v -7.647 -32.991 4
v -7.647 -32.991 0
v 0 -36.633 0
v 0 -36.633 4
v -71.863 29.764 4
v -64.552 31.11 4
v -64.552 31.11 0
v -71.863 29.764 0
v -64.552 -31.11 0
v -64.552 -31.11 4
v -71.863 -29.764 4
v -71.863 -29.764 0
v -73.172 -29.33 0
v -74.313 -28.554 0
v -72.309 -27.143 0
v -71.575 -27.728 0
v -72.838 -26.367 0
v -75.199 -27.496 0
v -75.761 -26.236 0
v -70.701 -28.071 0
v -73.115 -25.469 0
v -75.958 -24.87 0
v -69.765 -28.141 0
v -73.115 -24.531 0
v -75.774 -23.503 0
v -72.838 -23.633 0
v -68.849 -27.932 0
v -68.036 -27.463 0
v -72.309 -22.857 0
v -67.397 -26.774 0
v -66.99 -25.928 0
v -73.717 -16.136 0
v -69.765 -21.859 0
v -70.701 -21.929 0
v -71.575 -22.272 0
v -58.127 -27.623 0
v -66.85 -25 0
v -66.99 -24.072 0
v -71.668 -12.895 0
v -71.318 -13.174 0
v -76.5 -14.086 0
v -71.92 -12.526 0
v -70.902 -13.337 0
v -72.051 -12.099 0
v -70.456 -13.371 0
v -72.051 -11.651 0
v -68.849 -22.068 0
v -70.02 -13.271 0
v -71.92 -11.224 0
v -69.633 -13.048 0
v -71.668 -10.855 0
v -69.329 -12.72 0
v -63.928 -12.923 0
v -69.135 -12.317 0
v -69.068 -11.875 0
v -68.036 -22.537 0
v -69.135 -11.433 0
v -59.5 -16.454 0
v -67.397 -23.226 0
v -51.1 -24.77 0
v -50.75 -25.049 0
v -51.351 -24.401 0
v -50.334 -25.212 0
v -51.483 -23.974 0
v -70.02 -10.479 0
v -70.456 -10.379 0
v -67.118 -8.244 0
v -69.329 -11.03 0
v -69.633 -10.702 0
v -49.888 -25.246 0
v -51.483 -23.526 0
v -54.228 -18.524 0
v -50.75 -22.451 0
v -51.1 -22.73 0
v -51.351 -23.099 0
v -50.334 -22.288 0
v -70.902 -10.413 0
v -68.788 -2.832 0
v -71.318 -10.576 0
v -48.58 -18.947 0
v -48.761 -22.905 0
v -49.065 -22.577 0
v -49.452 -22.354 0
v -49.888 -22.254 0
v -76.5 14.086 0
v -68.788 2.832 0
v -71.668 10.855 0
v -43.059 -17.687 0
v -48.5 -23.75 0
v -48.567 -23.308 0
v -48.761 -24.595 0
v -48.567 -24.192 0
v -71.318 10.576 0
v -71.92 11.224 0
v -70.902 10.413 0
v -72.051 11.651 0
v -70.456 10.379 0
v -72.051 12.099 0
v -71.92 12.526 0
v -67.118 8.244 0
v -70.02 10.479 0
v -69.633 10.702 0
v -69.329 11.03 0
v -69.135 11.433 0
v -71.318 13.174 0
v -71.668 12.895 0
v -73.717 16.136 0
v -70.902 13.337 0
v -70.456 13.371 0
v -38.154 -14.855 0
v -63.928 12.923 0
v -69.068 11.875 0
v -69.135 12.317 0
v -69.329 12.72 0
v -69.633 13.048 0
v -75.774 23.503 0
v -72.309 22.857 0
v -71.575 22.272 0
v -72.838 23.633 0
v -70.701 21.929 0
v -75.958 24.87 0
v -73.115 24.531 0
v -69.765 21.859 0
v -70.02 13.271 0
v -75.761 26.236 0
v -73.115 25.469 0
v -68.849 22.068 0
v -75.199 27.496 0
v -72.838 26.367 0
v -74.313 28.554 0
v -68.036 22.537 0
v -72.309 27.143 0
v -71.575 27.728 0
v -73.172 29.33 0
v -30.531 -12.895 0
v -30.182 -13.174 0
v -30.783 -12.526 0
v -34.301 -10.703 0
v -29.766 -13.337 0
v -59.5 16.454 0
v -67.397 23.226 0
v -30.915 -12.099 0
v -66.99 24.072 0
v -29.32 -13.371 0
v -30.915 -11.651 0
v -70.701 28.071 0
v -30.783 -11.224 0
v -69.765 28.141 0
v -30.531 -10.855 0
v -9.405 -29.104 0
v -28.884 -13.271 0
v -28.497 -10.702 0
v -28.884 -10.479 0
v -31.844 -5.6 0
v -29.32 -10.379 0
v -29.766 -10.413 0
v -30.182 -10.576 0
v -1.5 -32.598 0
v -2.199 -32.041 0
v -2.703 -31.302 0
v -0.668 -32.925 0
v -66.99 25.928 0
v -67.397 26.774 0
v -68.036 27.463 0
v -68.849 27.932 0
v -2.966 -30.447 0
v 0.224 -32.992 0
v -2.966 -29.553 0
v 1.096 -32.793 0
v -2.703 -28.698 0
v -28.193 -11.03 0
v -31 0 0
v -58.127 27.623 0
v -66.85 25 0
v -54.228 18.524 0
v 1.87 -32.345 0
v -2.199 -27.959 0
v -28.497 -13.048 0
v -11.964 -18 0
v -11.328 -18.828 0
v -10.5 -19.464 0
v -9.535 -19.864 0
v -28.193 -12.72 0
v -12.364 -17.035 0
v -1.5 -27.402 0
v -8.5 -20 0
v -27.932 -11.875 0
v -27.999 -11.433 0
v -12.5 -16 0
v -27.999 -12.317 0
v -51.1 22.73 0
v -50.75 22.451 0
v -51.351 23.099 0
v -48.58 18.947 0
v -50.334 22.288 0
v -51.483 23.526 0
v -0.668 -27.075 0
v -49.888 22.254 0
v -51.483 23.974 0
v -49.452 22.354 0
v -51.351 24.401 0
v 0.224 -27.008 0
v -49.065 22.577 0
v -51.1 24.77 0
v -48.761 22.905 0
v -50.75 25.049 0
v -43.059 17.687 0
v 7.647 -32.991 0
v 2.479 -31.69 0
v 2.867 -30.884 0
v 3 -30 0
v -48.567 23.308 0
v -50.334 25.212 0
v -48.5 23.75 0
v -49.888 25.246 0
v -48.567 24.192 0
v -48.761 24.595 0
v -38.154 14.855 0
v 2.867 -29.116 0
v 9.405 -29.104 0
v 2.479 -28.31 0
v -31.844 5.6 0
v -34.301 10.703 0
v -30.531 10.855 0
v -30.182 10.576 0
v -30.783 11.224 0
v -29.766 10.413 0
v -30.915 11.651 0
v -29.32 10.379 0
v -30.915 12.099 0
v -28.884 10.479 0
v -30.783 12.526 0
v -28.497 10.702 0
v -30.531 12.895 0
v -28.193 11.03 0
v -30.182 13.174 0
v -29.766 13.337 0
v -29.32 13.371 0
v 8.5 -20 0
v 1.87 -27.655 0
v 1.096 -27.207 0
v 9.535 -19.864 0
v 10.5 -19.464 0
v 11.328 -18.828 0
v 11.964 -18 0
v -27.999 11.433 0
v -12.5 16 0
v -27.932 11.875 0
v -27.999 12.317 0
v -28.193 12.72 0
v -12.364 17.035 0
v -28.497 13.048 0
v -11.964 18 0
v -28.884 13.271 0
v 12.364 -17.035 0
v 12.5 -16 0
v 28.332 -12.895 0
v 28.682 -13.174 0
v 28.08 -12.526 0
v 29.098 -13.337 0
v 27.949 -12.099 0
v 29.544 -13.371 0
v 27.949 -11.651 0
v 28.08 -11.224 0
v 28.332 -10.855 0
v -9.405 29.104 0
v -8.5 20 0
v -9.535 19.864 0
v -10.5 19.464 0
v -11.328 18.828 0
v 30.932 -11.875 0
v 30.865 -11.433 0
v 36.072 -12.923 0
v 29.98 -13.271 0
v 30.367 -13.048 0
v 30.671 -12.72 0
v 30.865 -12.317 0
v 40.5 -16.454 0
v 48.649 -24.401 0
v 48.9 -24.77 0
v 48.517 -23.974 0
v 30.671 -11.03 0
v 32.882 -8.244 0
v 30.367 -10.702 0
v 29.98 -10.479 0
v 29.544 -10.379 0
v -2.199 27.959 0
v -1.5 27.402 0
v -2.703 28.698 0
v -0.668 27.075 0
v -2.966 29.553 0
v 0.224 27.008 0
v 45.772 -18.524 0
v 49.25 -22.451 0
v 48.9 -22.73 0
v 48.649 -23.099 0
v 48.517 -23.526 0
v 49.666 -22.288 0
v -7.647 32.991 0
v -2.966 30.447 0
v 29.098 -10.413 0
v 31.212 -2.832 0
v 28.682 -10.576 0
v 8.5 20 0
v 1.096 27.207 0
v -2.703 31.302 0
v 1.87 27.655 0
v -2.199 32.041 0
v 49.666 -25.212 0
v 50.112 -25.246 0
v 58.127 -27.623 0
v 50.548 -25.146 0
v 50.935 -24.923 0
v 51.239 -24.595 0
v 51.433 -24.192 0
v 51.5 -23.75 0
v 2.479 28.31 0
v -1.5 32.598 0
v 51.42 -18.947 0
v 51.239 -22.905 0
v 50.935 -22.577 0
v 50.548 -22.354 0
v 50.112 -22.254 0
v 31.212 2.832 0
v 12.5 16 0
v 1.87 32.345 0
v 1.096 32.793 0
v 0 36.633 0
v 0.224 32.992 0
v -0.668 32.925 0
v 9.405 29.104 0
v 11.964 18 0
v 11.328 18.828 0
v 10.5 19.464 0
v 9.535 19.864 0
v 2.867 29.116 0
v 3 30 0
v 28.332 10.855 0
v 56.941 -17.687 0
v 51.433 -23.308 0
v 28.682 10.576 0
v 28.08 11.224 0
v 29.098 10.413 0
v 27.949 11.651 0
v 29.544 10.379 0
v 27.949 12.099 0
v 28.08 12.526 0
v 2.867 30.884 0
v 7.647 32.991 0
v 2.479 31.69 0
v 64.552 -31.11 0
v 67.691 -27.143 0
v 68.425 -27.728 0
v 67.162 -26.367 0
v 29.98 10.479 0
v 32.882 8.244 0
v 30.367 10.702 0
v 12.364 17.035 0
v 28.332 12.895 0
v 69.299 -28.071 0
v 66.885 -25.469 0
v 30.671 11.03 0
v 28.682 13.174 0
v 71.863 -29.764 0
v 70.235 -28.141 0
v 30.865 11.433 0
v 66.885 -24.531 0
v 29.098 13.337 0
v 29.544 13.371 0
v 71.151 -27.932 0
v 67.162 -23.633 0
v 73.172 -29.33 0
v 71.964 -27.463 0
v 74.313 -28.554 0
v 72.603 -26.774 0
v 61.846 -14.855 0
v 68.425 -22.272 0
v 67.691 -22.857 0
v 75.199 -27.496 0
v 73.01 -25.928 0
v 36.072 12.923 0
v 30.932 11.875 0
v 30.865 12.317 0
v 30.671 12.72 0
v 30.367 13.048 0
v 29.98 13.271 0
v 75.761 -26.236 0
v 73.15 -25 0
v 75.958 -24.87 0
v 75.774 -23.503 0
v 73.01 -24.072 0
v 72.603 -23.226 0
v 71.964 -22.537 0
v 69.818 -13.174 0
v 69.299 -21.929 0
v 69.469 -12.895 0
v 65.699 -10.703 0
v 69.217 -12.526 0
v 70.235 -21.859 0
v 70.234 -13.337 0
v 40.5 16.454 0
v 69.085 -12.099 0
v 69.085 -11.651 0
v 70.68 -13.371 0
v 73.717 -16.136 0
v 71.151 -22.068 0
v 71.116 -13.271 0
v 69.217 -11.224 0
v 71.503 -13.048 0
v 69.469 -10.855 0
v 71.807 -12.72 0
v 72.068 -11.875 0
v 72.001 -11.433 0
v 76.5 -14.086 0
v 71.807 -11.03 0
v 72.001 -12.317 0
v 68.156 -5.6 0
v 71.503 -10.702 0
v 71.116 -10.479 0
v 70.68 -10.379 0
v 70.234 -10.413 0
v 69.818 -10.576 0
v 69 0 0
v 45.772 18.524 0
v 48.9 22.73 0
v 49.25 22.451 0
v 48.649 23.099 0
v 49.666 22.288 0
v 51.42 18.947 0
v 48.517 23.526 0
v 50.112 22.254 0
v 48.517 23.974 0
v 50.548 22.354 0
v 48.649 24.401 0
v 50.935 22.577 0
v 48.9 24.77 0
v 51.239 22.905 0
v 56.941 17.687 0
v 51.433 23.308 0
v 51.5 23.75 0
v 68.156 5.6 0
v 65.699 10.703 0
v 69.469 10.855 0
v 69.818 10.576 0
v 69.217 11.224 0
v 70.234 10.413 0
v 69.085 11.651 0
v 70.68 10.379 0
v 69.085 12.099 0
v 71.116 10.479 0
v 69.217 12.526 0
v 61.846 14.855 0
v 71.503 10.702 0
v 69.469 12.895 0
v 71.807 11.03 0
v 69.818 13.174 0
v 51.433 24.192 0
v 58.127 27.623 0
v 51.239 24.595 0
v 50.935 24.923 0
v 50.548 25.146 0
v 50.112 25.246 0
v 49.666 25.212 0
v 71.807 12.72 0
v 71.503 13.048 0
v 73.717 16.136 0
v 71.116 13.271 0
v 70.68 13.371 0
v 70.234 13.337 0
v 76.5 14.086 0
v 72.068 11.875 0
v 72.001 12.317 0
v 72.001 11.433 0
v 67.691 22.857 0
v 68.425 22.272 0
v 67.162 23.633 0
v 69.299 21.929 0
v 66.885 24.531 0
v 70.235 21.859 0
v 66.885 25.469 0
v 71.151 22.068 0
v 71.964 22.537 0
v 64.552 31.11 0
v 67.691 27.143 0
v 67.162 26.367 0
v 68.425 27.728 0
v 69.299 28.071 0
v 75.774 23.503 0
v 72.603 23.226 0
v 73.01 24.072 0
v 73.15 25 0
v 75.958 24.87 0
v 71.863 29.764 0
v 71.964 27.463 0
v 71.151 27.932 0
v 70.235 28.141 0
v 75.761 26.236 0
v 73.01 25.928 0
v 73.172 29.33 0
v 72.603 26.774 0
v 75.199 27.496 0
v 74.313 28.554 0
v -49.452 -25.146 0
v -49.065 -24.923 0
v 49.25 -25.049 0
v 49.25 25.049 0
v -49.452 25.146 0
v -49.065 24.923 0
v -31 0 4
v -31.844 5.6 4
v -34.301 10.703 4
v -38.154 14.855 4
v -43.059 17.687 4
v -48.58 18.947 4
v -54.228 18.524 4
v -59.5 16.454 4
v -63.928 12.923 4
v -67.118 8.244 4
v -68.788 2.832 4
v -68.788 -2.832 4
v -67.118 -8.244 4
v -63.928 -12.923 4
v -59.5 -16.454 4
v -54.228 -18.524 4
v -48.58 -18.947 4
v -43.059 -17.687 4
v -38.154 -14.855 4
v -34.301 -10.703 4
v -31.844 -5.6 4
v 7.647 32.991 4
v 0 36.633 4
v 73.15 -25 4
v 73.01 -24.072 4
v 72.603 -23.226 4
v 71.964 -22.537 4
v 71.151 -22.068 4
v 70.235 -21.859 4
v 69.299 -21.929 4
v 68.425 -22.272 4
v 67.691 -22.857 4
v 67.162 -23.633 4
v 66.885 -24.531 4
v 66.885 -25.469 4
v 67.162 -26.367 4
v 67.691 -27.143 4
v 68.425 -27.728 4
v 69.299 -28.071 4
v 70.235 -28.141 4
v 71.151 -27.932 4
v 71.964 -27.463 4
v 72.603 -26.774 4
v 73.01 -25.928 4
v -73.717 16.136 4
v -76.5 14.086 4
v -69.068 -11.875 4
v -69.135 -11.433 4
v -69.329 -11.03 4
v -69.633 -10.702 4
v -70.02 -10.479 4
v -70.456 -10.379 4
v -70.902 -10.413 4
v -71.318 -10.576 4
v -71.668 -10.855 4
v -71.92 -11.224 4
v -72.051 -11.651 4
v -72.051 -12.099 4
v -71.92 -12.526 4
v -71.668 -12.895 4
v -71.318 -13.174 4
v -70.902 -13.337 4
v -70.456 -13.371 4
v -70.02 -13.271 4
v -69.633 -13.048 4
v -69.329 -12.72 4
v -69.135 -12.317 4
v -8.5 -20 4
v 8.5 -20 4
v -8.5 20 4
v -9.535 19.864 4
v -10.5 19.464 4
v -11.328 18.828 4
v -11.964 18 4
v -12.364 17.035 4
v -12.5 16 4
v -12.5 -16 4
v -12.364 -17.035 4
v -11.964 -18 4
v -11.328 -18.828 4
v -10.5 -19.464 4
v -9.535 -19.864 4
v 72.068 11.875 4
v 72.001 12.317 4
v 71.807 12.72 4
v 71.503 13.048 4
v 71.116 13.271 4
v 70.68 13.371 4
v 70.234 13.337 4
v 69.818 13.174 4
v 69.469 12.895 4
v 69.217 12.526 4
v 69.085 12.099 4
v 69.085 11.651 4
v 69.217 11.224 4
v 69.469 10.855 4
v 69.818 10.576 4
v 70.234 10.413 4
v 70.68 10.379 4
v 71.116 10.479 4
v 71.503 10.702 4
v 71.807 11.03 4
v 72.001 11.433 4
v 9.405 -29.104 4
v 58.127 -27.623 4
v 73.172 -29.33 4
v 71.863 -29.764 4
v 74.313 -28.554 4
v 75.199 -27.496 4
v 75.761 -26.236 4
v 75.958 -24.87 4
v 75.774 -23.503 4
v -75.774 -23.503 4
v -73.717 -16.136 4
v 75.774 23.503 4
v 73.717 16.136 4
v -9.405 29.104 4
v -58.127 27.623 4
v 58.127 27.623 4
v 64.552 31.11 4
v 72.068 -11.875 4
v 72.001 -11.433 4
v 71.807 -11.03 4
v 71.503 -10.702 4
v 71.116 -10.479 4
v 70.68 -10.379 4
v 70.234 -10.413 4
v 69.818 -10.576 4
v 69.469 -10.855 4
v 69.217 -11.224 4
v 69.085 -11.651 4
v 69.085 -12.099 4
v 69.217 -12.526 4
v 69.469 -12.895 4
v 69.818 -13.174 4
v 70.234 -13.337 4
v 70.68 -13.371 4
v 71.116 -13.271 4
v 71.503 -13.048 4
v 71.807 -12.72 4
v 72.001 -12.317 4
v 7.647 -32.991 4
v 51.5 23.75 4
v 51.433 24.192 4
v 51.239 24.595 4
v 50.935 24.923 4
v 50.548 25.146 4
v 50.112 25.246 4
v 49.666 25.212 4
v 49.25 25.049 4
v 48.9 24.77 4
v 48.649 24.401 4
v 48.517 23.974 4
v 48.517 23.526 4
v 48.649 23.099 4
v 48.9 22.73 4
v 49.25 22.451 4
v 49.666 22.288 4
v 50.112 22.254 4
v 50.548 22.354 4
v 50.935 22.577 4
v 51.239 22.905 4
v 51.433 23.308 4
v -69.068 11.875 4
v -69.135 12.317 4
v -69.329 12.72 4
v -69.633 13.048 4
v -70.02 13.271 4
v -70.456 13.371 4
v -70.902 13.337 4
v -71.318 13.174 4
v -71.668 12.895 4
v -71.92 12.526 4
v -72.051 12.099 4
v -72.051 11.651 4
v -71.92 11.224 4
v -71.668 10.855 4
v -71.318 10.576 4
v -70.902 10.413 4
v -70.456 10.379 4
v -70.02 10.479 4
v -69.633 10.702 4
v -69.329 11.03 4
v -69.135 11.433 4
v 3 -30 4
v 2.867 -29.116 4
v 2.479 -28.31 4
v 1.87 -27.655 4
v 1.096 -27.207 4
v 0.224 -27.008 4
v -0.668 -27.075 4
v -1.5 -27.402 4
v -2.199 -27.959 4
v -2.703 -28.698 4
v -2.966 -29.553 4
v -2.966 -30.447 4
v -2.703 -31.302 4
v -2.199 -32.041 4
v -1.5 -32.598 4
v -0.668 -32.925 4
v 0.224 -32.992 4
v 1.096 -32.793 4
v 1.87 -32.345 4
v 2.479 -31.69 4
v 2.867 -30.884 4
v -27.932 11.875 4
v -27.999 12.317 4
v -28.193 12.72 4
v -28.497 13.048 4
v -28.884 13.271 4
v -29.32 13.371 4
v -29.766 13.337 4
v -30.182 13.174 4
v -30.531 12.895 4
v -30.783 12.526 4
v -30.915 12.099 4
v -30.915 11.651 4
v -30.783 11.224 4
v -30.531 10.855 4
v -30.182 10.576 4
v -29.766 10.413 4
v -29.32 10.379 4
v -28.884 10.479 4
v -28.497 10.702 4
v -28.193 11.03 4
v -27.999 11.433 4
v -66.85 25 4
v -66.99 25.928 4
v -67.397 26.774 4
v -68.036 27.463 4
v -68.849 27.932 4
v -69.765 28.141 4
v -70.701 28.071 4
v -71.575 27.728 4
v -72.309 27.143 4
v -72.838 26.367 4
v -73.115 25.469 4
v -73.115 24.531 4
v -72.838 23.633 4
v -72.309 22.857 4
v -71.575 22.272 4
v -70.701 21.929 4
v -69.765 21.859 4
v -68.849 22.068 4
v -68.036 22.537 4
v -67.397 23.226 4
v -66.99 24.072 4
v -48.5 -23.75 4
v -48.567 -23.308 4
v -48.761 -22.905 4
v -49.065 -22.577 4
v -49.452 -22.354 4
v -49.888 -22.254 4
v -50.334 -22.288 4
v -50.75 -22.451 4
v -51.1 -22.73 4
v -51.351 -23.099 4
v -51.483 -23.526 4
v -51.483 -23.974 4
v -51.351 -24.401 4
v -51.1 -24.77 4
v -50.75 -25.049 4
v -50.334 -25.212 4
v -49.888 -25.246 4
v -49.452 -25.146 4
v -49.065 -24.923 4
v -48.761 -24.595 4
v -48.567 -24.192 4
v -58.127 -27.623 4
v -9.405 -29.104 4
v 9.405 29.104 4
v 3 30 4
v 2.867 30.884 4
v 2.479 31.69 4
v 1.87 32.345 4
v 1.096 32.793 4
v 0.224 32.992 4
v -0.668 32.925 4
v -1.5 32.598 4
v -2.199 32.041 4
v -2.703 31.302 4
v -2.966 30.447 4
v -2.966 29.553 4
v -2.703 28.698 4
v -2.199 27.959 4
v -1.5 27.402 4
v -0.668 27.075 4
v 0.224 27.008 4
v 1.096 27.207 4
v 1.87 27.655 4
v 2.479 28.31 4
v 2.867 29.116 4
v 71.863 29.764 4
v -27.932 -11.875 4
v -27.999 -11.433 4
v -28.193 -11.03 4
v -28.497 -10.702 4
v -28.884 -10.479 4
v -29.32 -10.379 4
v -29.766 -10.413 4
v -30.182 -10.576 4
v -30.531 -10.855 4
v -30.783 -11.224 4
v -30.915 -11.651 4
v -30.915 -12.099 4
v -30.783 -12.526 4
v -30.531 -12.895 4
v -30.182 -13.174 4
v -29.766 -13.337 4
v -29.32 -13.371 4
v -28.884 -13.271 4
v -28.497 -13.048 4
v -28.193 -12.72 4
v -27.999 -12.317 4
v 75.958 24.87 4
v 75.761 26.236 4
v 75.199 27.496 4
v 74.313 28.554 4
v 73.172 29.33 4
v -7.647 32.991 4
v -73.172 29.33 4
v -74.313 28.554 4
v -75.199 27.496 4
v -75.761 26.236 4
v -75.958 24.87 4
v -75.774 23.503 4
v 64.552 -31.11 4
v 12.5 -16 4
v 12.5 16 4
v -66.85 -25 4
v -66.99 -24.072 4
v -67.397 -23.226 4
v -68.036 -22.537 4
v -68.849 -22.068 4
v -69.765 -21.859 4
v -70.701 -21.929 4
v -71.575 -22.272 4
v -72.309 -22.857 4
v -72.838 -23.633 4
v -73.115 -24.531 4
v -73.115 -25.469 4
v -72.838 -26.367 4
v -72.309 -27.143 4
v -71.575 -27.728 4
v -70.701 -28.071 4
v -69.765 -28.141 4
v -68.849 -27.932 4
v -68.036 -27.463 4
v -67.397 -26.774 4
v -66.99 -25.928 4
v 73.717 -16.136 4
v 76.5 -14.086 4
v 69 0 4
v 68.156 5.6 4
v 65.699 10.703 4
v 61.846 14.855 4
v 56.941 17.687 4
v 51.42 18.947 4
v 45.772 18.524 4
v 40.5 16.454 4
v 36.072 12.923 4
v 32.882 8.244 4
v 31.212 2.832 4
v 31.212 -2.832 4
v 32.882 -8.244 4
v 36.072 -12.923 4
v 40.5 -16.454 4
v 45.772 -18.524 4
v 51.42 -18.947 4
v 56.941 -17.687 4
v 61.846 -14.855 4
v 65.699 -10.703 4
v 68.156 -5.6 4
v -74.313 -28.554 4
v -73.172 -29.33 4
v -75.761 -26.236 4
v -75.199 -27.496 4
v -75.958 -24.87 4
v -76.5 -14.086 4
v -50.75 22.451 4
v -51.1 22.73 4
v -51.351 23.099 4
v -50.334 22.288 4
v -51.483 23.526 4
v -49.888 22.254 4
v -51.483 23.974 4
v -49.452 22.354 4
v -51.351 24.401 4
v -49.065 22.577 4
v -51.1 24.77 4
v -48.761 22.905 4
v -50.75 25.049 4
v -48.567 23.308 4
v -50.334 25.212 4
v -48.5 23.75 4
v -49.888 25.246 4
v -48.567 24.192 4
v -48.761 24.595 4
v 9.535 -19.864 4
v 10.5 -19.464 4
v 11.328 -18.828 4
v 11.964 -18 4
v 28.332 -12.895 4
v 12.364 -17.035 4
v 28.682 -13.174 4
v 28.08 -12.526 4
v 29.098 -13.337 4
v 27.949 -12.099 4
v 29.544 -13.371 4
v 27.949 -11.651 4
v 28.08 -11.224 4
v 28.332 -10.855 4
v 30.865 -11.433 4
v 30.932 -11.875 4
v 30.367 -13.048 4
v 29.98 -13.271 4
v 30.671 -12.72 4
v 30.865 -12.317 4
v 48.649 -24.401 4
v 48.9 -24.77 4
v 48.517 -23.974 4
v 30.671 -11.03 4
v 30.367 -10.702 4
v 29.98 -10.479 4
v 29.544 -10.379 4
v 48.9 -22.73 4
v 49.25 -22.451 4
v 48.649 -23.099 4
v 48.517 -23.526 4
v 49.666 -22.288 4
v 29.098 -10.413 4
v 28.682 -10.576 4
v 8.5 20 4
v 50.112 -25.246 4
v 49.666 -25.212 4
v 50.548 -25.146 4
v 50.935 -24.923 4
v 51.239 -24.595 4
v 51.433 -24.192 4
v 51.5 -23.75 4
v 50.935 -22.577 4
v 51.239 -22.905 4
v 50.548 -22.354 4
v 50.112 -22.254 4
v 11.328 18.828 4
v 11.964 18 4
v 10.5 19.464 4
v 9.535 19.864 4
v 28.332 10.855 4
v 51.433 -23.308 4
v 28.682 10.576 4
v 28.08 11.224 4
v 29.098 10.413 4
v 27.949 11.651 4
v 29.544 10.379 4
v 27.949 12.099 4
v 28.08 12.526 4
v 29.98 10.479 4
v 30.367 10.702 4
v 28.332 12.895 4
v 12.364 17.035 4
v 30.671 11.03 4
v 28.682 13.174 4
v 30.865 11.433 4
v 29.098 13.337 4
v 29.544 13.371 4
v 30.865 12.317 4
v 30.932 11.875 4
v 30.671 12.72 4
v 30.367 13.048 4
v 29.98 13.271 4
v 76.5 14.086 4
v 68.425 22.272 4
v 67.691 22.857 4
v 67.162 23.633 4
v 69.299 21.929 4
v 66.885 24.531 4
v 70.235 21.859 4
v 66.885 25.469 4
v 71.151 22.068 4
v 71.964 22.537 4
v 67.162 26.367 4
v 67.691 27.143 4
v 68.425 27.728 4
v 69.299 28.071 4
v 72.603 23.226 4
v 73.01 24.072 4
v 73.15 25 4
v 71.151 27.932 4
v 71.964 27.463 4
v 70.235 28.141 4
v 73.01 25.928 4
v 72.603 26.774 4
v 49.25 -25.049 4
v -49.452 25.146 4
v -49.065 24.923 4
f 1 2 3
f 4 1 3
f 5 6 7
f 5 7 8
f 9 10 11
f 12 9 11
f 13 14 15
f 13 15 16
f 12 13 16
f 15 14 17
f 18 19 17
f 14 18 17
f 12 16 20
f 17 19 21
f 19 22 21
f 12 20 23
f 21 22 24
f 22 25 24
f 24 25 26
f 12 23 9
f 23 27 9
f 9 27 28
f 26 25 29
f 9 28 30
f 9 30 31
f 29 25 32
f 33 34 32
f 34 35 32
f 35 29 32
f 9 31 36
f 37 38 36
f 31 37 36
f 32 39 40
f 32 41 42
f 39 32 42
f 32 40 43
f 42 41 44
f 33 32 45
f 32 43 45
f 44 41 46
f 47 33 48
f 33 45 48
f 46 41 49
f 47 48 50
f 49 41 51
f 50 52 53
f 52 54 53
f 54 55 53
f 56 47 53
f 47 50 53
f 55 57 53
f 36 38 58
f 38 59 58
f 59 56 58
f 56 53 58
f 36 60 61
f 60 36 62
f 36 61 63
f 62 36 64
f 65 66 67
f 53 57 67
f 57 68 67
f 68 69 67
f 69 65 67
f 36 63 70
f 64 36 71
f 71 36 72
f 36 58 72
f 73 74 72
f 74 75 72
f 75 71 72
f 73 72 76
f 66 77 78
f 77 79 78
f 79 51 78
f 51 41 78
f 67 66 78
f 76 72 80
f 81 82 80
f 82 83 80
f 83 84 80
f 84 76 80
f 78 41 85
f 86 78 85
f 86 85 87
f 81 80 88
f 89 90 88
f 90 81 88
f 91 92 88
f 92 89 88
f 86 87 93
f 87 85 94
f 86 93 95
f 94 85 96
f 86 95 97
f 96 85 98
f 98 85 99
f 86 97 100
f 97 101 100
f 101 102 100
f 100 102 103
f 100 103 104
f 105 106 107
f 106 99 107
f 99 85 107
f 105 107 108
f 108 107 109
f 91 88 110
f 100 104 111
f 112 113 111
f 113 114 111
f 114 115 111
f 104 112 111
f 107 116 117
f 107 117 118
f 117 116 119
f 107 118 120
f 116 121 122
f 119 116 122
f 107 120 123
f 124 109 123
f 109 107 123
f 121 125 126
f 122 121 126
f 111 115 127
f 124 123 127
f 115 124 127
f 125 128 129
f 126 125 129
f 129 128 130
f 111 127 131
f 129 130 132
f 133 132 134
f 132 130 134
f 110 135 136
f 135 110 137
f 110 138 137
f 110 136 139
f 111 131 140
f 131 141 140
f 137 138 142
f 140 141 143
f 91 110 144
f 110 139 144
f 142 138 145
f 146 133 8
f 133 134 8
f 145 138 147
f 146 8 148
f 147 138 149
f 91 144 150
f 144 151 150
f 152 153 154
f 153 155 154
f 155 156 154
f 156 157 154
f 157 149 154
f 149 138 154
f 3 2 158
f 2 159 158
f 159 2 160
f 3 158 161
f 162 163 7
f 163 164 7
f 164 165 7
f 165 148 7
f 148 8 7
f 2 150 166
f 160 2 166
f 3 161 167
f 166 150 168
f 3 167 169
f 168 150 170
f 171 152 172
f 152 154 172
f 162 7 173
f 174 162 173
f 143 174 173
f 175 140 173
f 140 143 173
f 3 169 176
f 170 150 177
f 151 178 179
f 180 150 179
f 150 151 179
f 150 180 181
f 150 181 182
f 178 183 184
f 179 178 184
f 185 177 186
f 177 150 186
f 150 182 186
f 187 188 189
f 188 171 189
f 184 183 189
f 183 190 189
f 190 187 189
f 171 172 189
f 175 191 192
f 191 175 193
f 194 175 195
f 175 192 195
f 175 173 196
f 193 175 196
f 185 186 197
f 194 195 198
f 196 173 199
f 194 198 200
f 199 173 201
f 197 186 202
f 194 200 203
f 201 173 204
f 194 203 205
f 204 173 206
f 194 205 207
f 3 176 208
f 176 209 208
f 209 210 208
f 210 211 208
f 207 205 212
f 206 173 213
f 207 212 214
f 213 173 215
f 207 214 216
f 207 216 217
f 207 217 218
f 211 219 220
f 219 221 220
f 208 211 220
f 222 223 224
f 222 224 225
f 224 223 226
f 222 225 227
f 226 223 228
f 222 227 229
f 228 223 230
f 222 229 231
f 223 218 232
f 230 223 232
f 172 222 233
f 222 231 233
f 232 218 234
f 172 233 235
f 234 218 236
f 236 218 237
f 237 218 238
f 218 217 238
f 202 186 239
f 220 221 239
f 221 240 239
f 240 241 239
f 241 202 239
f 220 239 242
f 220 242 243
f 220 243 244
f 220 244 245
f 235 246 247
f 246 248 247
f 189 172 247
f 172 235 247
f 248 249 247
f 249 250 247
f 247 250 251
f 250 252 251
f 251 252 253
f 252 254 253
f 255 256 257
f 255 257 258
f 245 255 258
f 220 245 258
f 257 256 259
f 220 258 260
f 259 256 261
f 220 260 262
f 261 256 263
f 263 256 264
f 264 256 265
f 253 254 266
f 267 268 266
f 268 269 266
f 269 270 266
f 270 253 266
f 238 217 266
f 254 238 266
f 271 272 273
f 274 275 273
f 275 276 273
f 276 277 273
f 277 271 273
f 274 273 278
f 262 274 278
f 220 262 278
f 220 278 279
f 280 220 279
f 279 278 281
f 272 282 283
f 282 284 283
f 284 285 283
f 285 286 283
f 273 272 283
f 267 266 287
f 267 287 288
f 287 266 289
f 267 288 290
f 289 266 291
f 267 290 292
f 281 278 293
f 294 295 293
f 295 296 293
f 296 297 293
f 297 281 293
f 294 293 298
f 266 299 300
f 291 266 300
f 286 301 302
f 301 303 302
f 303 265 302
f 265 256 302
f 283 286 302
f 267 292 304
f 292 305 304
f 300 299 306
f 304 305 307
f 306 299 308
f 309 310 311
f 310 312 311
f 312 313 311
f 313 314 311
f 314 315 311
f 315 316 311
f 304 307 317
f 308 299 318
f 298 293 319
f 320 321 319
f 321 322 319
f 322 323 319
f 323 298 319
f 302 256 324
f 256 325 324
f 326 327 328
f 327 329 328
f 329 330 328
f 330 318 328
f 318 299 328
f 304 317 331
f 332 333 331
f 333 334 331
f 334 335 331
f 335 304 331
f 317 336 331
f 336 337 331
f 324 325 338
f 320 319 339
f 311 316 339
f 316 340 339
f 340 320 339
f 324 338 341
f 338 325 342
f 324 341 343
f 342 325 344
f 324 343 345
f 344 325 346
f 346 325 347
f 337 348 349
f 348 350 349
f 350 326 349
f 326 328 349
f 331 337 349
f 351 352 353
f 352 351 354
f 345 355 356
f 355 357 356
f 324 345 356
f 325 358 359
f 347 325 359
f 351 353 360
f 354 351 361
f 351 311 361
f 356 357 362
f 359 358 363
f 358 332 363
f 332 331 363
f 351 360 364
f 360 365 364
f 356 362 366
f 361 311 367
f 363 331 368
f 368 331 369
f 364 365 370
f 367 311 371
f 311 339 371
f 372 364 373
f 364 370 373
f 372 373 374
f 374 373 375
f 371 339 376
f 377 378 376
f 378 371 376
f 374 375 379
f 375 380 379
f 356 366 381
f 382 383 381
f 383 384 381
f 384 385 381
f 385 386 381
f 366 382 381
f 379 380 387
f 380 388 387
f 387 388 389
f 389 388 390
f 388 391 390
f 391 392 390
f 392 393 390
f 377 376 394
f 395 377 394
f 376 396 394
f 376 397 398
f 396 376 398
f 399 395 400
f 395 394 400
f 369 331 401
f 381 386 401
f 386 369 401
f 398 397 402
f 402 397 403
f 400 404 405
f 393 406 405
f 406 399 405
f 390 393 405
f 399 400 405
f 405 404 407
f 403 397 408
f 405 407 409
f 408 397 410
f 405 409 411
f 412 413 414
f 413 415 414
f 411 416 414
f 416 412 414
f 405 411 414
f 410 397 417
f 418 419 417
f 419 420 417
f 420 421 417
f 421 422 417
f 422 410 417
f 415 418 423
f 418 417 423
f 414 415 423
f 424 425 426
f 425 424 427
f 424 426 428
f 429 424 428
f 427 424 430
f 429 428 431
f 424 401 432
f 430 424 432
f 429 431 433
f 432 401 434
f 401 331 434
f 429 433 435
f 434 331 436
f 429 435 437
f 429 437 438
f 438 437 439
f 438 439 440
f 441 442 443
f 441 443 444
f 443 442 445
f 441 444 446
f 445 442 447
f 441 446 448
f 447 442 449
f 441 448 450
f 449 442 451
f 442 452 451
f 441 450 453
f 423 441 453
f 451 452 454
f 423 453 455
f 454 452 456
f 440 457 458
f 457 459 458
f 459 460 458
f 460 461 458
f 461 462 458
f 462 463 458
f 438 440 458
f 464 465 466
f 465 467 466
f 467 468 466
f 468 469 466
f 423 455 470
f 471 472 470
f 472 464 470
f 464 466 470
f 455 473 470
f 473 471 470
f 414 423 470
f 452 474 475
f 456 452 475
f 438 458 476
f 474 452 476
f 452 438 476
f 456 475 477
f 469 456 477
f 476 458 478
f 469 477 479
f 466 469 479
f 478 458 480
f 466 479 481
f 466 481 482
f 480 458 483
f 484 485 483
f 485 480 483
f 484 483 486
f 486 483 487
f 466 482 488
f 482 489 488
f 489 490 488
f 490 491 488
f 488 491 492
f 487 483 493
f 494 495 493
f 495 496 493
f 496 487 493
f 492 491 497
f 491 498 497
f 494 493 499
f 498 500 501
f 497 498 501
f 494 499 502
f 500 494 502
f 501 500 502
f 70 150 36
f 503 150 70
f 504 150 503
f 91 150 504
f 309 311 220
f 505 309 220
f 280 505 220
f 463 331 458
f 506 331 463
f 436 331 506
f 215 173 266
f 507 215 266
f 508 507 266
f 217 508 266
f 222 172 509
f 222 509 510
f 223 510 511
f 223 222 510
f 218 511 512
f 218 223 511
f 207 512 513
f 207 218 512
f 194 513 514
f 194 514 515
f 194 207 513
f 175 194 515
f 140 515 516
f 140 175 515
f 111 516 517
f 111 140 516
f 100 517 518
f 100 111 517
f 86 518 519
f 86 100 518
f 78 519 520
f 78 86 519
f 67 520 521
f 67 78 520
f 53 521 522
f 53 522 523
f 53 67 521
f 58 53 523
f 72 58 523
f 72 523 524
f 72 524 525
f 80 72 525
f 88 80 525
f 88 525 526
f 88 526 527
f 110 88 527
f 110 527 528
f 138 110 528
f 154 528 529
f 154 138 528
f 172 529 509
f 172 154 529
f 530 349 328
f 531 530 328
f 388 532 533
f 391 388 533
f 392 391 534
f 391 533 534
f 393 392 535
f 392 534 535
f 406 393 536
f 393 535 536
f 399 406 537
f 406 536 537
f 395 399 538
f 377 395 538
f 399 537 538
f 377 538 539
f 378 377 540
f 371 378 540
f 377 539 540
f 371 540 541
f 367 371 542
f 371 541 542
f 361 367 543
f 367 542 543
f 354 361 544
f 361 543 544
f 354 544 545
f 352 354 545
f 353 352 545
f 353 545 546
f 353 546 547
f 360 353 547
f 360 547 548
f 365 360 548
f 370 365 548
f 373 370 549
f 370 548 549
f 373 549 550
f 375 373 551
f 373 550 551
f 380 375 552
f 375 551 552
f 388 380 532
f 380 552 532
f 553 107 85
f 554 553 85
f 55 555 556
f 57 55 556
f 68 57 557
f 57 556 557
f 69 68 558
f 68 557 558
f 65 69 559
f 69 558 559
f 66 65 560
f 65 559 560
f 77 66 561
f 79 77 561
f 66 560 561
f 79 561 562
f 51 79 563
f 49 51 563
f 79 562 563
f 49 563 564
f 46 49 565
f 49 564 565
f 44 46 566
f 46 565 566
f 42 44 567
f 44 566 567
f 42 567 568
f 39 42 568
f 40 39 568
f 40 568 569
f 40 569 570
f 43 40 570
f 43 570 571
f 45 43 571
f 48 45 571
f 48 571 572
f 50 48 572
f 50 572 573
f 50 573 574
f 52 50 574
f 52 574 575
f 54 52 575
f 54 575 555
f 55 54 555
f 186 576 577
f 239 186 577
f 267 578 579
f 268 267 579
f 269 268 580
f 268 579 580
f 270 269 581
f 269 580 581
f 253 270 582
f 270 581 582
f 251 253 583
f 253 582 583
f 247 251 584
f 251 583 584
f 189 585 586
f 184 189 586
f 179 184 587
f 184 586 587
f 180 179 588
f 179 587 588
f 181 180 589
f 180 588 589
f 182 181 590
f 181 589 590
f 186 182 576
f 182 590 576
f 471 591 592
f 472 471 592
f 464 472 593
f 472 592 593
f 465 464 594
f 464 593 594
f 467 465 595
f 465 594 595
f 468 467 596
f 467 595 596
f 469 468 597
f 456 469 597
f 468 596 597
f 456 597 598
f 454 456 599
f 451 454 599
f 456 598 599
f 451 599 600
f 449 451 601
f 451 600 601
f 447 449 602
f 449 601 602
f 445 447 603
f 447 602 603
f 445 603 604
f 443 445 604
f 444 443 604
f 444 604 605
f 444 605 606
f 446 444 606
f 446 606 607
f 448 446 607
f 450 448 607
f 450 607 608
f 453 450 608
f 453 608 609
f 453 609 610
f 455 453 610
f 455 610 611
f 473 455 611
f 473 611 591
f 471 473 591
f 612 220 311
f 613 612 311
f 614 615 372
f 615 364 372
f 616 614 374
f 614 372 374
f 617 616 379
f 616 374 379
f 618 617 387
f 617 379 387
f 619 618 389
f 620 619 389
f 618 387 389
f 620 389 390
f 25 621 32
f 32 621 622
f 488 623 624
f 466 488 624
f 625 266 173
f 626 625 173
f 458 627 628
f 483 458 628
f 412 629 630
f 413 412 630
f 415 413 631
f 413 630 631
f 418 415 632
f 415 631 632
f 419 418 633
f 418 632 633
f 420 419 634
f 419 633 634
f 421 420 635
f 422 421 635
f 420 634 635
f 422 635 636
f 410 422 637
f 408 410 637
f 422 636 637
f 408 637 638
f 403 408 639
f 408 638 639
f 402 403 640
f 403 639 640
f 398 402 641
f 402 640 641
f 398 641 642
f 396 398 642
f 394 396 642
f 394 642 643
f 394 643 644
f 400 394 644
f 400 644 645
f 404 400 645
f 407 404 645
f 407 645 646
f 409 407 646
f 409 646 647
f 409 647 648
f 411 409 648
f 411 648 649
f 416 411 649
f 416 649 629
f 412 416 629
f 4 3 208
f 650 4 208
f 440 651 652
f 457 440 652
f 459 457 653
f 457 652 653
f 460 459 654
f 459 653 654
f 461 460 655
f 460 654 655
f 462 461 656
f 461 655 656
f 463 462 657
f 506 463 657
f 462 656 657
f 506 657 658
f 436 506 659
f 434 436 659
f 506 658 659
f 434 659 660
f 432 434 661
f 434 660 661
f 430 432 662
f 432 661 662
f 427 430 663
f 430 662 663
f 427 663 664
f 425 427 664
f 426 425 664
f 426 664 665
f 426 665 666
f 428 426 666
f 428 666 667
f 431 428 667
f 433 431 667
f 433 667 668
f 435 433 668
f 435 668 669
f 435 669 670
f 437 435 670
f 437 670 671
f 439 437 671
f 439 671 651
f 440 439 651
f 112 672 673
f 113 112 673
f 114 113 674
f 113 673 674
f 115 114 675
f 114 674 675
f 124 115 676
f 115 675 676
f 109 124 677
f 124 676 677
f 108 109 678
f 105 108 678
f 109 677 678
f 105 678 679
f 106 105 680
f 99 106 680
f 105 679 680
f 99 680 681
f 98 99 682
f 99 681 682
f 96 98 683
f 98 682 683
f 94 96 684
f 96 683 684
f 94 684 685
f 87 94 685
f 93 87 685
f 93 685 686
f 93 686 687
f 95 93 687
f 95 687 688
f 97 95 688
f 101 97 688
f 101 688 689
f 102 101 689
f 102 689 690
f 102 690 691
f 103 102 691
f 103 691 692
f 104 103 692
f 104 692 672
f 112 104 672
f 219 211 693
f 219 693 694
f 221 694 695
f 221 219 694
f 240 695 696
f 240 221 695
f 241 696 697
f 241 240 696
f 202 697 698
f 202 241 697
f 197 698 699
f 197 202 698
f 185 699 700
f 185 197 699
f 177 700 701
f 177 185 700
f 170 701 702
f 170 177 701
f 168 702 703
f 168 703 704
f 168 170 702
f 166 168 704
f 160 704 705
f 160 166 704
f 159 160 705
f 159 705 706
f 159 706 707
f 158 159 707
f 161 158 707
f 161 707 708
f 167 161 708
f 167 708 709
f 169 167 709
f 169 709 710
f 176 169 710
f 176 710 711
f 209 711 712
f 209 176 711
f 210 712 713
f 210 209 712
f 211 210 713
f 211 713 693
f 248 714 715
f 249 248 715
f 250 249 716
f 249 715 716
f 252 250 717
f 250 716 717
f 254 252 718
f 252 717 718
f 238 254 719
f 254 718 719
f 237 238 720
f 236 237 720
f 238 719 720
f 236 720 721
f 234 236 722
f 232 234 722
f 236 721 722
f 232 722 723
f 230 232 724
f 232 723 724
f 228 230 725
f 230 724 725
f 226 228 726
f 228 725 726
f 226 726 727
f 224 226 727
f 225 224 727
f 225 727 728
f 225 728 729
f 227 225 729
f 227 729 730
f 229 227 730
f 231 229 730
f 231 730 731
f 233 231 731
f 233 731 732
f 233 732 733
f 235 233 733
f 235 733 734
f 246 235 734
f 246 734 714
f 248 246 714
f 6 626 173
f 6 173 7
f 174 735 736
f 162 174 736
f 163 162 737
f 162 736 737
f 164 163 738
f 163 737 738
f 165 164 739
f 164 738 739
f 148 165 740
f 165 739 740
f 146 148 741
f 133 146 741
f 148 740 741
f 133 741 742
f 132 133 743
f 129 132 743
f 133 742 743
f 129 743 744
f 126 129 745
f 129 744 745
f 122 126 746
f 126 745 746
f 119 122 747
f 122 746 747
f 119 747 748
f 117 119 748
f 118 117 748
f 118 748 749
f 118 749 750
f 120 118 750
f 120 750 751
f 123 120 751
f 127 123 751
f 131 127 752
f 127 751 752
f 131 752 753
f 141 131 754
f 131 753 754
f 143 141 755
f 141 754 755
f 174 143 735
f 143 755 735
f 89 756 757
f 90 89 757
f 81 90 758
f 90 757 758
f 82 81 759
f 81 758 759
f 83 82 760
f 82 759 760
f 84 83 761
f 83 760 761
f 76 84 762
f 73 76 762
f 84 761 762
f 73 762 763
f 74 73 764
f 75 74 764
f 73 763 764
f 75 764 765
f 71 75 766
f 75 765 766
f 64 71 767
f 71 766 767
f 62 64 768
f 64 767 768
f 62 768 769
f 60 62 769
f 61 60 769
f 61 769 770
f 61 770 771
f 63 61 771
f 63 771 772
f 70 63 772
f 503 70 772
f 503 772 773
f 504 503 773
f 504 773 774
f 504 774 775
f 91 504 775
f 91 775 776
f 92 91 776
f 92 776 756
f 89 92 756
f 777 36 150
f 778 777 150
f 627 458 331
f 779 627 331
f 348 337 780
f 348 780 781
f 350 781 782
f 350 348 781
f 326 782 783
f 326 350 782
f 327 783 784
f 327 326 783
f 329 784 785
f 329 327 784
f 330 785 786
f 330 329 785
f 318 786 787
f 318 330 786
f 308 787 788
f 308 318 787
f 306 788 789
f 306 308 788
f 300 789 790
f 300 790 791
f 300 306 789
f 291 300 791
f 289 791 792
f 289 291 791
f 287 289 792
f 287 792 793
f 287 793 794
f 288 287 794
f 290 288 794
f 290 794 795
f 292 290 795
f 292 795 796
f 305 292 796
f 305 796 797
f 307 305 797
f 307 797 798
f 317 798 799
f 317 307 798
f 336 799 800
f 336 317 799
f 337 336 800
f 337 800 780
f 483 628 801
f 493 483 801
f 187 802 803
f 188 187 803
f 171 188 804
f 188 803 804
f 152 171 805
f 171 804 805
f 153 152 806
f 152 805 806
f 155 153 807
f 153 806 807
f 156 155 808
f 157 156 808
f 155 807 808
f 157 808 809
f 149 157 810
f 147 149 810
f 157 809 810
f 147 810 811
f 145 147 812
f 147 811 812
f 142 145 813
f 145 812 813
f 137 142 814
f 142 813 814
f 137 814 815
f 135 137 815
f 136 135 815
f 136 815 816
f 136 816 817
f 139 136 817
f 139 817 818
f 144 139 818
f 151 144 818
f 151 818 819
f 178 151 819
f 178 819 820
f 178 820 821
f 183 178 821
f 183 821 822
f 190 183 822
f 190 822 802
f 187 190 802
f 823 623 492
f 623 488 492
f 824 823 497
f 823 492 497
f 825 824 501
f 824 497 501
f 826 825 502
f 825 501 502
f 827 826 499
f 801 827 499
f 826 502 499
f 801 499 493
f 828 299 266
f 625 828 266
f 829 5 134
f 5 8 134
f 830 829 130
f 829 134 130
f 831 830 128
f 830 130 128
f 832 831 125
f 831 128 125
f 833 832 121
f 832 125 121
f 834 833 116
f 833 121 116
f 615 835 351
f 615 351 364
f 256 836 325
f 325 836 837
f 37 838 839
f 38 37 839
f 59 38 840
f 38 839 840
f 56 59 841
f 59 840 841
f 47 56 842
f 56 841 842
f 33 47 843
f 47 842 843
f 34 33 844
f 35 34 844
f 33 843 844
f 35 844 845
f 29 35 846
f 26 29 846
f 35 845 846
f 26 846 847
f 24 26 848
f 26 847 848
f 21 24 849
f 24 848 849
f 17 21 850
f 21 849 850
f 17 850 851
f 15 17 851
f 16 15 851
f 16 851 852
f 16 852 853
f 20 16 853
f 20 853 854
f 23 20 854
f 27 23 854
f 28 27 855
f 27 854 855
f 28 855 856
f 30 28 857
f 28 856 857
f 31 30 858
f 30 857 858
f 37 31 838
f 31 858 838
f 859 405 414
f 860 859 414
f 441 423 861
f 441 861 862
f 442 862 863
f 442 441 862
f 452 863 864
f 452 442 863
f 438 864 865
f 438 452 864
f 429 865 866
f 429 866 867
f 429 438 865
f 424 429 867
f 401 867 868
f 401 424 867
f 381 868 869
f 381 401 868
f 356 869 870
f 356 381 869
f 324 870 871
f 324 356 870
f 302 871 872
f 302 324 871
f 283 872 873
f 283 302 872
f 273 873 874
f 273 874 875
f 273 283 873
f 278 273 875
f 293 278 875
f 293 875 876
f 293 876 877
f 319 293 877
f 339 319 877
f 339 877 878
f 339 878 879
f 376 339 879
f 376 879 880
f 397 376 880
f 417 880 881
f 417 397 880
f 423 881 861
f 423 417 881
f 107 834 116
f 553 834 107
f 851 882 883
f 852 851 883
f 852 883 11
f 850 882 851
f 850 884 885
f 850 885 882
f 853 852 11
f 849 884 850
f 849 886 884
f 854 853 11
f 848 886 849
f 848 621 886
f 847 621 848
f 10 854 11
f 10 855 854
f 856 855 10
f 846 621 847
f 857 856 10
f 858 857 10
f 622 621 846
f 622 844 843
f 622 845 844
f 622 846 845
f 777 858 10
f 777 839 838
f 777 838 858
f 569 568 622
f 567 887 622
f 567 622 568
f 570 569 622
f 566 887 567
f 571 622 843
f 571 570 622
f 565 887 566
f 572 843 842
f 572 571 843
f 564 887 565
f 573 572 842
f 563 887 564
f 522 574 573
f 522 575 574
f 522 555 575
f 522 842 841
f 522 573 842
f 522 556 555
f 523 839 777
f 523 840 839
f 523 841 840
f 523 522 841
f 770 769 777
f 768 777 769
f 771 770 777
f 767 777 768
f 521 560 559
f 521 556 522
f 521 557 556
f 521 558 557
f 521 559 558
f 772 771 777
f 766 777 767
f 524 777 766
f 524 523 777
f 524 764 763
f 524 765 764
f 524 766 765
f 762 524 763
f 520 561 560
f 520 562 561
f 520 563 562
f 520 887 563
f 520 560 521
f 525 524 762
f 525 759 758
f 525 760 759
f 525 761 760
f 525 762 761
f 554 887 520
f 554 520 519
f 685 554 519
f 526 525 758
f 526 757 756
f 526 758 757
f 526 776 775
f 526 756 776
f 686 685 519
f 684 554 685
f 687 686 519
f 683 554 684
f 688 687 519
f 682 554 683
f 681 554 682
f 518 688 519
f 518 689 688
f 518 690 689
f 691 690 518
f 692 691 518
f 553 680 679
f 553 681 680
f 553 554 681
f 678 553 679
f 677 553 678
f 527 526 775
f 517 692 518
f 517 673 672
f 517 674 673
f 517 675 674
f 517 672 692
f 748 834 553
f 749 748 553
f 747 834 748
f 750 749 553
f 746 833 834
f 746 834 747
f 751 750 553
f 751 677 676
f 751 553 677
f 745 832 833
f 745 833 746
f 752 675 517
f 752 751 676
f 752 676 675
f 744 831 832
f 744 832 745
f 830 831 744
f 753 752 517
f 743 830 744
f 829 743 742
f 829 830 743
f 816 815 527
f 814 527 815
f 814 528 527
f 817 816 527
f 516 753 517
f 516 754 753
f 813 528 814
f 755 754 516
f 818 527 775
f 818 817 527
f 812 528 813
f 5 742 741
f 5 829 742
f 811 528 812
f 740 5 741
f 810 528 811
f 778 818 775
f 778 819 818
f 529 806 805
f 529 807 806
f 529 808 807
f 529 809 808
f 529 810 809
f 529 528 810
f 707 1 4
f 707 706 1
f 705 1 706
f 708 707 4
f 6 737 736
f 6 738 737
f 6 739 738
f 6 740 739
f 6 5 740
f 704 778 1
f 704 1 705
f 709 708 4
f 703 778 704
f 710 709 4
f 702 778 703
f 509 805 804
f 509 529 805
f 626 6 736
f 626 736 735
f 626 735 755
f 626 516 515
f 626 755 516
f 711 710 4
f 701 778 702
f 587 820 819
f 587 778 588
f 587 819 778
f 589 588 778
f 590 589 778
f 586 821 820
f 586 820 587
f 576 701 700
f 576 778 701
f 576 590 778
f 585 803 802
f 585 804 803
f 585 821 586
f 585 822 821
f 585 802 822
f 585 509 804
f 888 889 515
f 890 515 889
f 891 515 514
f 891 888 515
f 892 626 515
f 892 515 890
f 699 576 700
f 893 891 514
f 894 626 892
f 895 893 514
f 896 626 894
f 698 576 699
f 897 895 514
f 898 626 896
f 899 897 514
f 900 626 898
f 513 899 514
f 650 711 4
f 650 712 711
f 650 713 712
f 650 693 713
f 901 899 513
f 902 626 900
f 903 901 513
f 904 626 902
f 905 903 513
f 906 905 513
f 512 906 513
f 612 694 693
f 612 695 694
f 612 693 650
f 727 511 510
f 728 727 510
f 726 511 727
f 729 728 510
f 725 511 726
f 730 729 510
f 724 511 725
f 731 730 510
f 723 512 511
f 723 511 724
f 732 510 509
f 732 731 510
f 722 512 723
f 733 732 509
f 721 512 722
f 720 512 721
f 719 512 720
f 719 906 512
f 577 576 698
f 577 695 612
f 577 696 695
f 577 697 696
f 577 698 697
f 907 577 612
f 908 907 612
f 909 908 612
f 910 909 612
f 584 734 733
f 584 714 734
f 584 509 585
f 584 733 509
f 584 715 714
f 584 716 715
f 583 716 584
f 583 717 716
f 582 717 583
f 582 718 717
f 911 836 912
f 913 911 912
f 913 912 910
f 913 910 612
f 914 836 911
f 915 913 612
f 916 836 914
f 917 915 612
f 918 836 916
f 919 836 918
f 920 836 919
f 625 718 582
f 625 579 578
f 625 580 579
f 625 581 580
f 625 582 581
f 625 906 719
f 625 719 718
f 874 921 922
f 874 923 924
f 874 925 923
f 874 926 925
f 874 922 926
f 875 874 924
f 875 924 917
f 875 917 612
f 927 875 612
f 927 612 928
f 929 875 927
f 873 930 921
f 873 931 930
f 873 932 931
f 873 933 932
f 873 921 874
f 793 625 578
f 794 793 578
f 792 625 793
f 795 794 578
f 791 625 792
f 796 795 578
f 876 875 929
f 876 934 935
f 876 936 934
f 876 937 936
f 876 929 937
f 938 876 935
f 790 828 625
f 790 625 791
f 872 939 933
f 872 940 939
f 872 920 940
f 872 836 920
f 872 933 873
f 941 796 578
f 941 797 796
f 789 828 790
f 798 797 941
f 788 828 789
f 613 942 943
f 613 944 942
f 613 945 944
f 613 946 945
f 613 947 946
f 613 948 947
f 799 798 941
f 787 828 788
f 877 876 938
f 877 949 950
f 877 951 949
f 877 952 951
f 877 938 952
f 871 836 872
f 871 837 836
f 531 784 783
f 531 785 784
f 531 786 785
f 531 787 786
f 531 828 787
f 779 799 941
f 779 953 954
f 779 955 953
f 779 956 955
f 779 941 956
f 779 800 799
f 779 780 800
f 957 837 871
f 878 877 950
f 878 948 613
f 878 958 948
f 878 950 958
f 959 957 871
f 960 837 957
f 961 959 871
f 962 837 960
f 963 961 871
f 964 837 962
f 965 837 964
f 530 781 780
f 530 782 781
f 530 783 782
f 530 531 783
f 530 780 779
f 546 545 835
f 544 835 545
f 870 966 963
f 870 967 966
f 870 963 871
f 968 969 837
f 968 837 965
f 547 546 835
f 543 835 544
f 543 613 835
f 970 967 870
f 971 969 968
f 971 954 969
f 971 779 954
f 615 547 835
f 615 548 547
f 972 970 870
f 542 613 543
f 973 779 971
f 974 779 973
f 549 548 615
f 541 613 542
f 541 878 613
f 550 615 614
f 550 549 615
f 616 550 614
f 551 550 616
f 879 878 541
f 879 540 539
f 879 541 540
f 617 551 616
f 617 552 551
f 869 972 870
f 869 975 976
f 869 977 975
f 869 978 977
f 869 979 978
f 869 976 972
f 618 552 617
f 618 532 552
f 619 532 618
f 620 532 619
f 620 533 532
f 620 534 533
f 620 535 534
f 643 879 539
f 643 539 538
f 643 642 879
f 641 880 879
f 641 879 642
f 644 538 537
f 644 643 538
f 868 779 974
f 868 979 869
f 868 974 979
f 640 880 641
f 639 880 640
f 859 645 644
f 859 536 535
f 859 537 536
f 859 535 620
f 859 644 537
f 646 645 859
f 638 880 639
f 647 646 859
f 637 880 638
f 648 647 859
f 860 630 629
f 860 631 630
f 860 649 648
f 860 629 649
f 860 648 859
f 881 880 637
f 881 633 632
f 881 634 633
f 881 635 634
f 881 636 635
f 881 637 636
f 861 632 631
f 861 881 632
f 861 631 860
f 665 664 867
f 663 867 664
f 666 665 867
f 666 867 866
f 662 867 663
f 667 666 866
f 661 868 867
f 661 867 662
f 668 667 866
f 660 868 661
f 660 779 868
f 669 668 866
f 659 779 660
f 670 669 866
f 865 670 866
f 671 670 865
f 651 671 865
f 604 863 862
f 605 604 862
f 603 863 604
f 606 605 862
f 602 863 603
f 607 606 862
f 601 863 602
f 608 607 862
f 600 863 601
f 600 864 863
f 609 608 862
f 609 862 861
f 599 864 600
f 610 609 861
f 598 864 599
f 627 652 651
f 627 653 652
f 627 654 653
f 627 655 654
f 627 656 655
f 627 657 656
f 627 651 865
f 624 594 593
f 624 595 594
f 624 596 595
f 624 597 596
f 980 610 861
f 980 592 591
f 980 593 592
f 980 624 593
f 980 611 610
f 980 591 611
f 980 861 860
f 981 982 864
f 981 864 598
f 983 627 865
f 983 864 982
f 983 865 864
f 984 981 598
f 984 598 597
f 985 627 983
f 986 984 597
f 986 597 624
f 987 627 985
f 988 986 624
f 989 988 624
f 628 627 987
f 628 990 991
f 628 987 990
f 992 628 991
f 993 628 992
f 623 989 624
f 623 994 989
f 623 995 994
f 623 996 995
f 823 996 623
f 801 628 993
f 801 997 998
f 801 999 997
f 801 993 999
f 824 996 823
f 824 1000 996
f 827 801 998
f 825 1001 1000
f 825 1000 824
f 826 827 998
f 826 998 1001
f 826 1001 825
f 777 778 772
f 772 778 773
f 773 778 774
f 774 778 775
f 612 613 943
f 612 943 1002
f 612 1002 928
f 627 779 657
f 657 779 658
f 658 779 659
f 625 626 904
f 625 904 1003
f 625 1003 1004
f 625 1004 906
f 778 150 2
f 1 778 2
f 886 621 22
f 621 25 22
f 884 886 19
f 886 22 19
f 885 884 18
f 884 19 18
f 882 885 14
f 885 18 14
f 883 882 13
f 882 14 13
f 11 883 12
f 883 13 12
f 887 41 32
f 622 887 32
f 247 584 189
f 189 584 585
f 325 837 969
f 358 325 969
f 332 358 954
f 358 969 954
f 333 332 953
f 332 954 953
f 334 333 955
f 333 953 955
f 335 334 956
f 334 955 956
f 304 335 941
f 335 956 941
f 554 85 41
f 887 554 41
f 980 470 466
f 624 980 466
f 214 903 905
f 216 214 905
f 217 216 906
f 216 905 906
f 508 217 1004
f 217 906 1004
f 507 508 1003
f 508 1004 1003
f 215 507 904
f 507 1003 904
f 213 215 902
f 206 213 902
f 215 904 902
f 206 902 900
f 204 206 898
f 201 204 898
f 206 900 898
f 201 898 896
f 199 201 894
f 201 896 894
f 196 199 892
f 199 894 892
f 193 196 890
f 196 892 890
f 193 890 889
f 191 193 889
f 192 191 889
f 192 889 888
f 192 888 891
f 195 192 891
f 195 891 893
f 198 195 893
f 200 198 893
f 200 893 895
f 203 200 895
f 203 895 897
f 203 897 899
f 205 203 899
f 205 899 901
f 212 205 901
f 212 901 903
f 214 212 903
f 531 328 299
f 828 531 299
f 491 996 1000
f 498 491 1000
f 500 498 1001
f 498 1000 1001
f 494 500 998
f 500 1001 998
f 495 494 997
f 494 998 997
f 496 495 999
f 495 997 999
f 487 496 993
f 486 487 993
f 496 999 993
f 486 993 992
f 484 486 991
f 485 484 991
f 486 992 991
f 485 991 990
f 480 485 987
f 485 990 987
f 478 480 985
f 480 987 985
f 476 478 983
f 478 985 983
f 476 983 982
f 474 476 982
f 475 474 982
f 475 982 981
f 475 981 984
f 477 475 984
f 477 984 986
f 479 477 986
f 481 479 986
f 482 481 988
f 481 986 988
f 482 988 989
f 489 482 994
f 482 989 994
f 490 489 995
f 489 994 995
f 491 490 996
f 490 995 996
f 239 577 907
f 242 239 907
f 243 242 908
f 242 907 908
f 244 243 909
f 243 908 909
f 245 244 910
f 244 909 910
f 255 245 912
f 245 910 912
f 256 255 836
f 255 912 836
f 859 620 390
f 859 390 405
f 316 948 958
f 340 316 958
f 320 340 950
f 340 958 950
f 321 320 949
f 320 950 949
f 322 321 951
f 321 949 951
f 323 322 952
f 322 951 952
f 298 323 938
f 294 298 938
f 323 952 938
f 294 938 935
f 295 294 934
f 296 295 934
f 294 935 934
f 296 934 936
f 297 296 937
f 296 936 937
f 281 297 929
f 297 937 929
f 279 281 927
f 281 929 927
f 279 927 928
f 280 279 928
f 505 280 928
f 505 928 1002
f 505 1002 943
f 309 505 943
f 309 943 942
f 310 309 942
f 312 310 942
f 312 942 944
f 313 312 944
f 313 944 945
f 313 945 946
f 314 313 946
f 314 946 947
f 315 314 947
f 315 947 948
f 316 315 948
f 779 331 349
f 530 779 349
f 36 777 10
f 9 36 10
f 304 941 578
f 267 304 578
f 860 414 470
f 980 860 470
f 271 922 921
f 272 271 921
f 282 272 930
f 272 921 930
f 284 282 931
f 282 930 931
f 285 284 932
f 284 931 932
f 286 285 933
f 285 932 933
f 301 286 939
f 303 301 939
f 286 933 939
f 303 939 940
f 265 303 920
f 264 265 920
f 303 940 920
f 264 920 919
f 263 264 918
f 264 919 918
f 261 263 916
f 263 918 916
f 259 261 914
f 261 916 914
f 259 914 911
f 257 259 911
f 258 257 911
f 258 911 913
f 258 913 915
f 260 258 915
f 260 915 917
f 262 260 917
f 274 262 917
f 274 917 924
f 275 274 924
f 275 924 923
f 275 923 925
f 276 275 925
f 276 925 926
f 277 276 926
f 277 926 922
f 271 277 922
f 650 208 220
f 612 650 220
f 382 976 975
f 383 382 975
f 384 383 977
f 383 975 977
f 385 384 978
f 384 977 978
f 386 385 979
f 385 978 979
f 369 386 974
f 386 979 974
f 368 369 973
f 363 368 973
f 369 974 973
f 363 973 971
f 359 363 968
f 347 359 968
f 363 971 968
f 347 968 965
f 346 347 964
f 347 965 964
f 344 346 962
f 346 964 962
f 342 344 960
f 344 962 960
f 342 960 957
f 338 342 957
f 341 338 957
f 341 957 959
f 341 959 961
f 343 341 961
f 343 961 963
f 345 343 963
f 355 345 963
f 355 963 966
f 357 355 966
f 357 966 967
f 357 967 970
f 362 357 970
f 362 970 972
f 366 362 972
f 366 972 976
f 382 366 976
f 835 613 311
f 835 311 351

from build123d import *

# Parameters (mm, degrees)
SKETCH1_R           = 3
SKETCH1_R_2         = 19
BOSS_EXTRUDE1_DEPTH = 4
CUT_EXTRUDE1_DEPTH  = 5
SKETCH3_R           = 3.15
BOSS_EXTRUDE2_DEPTH = 4
FILLET1_R           = 5
SKETCH4_R           = 1.5
CUT_EXTRUDE2_DEPTH  = 5


with BuildPart() as part:
    # Sketch1 → Boss-Extrude1 (new body)
    with BuildSketch(Plane.XY):
        Polygon((0, 36.632796194), (-7.647271147, 32.990762303), (-9.405300929, 29.104152359), (-58.126981429, 27.62278105), (-76.5, 14.085859857), (-76.5, -14.085859857), (-58.126981429, -27.62278105), (-9.405300929, -29.104152359), (-7.647271147, -32.990762303), (0, -36.632796194), (7.647271147, -32.990762303), (9.405300929, -29.104152359), (58.126981429, -27.62278105), (76.5, -14.085859857), (76.5, 14.085859857), (58.126981429, 27.62278105), (9.405300929, 29.104152359), (7.647271147, 32.990762303), align=None)
        with Locations((0, 30)):
            Circle(SKETCH1_R, mode=Mode.SUBTRACT)
        with Locations((-50, 0)):
            Circle(SKETCH1_R_2, mode=Mode.SUBTRACT)
        with Locations((50, 0)):
            Circle(SKETCH1_R_2, mode=Mode.SUBTRACT)
        with Locations((0, -30)):
            Circle(SKETCH1_R, mode=Mode.SUBTRACT)
    extrude(amount=BOSS_EXTRUDE1_DEPTH)

    # Sketch2 → Cut-Extrude1 (cut, through all)
    with BuildSketch(Plane.XY.offset(4)):
        with BuildLine():
            Line((8.5, 20), (-8.5, 20))
            ThreePointArc((-8.5, 20), (-11.328427125, 18.828427125), (-12.5, 16))
            Line((-12.5, 16), (-12.5, -16))
            ThreePointArc((-12.5, -16), (-11.328427125, -18.828427125), (-8.5, -20))
            Line((-8.5, -20), (8.5, -20))
            ThreePointArc((8.5, -20), (11.328427125, -18.828427125), (12.5, -16))
            Line((12.5, -16), (12.5, 16))
            ThreePointArc((12.5, 16), (11.328427125, 18.828427125), (8.5, 20))
        make_face()
    extrude(amount=-CUT_EXTRUDE1_DEPTH, mode=Mode.SUBTRACT)

    # Sketch3 → Boss-Extrude2 (add)
    with BuildSketch(Plane.XY.offset(4)):
        Polygon((-58.126981429, 27.62278105), (-64.551915182, 31.10998542), (-77.245081729, 28.773819798), (-73.717039059, 16.136297176), align=None)
        with Locations((-70, 25)):
            Circle(SKETCH3_R, mode=Mode.SUBTRACT)
        Polygon((73.717039059, 16.136297176), (58.126981429, 27.62278105), (64.551915182, 31.10998542), (77.245081729, 28.773819798), align=None)
        with Locations((70, 25)):
            Circle(SKETCH3_R, mode=Mode.SUBTRACT)
        Polygon((58.126981429, -27.62278105), (64.551915182, -31.10998542), (77.245081729, -28.773819798), (73.717039059, -16.136297176), align=None)
        with Locations((70, -25)):
            Circle(SKETCH3_R, mode=Mode.SUBTRACT)
        Polygon((-73.717039059, -16.136297176), (-58.126981429, -27.62278105), (-64.551915182, -31.10998542), (-77.245081729, -28.773819798), align=None)
        with Locations((-70, -25)):
            Circle(SKETCH3_R, mode=Mode.SUBTRACT)
    extrude(amount=-BOSS_EXTRUDE2_DEPTH)

    # Fillet1
    fillet1_edges = [part.edges().sort_by_distance(p)[0] for p in [
        (77.245081729, 28.773819798, 2),
        (77.245081729, -28.773819798, 2),
        (-77.245081729, -28.773819798, 2),
        (-77.245081729, 28.773819798, 2),
    ]]
    fillet(fillet1_edges, radius=FILLET1_R)

    # Sketch4 → Cut-Extrude2 (cut, through all)
    with BuildSketch(Plane.XY.offset(4)):
        with Locations((-50, 23.75)):
            Circle(SKETCH4_R)
        with Locations((-70.56810334, 11.875)):
            Circle(SKETCH4_R)
        with Locations((-70.56810334, -11.875)):
            Circle(SKETCH4_R)
        with Locations((-50, -23.75)):
            Circle(SKETCH4_R)
        with Locations((-29.43189666, -11.875)):
            Circle(SKETCH4_R)
        with Locations((-29.43189666, 11.875)):
            Circle(SKETCH4_R)
        with Locations((29.43189666, 11.875)):
            Circle(SKETCH4_R)
        with Locations((29.43189666, -11.875)):
            Circle(SKETCH4_R)
        with Locations((50, -23.75)):
            Circle(SKETCH4_R)
        with Locations((70.56810334, -11.875)):
            Circle(SKETCH4_R)
        with Locations((70.56810334, 11.875)):
            Circle(SKETCH4_R)
        with Locations((50, 23.75)):
            Circle(SKETCH4_R)
    extrude(amount=-CUT_EXTRUDE2_DEPTH, mode=Mode.SUBTRACT)


solid = part.part
